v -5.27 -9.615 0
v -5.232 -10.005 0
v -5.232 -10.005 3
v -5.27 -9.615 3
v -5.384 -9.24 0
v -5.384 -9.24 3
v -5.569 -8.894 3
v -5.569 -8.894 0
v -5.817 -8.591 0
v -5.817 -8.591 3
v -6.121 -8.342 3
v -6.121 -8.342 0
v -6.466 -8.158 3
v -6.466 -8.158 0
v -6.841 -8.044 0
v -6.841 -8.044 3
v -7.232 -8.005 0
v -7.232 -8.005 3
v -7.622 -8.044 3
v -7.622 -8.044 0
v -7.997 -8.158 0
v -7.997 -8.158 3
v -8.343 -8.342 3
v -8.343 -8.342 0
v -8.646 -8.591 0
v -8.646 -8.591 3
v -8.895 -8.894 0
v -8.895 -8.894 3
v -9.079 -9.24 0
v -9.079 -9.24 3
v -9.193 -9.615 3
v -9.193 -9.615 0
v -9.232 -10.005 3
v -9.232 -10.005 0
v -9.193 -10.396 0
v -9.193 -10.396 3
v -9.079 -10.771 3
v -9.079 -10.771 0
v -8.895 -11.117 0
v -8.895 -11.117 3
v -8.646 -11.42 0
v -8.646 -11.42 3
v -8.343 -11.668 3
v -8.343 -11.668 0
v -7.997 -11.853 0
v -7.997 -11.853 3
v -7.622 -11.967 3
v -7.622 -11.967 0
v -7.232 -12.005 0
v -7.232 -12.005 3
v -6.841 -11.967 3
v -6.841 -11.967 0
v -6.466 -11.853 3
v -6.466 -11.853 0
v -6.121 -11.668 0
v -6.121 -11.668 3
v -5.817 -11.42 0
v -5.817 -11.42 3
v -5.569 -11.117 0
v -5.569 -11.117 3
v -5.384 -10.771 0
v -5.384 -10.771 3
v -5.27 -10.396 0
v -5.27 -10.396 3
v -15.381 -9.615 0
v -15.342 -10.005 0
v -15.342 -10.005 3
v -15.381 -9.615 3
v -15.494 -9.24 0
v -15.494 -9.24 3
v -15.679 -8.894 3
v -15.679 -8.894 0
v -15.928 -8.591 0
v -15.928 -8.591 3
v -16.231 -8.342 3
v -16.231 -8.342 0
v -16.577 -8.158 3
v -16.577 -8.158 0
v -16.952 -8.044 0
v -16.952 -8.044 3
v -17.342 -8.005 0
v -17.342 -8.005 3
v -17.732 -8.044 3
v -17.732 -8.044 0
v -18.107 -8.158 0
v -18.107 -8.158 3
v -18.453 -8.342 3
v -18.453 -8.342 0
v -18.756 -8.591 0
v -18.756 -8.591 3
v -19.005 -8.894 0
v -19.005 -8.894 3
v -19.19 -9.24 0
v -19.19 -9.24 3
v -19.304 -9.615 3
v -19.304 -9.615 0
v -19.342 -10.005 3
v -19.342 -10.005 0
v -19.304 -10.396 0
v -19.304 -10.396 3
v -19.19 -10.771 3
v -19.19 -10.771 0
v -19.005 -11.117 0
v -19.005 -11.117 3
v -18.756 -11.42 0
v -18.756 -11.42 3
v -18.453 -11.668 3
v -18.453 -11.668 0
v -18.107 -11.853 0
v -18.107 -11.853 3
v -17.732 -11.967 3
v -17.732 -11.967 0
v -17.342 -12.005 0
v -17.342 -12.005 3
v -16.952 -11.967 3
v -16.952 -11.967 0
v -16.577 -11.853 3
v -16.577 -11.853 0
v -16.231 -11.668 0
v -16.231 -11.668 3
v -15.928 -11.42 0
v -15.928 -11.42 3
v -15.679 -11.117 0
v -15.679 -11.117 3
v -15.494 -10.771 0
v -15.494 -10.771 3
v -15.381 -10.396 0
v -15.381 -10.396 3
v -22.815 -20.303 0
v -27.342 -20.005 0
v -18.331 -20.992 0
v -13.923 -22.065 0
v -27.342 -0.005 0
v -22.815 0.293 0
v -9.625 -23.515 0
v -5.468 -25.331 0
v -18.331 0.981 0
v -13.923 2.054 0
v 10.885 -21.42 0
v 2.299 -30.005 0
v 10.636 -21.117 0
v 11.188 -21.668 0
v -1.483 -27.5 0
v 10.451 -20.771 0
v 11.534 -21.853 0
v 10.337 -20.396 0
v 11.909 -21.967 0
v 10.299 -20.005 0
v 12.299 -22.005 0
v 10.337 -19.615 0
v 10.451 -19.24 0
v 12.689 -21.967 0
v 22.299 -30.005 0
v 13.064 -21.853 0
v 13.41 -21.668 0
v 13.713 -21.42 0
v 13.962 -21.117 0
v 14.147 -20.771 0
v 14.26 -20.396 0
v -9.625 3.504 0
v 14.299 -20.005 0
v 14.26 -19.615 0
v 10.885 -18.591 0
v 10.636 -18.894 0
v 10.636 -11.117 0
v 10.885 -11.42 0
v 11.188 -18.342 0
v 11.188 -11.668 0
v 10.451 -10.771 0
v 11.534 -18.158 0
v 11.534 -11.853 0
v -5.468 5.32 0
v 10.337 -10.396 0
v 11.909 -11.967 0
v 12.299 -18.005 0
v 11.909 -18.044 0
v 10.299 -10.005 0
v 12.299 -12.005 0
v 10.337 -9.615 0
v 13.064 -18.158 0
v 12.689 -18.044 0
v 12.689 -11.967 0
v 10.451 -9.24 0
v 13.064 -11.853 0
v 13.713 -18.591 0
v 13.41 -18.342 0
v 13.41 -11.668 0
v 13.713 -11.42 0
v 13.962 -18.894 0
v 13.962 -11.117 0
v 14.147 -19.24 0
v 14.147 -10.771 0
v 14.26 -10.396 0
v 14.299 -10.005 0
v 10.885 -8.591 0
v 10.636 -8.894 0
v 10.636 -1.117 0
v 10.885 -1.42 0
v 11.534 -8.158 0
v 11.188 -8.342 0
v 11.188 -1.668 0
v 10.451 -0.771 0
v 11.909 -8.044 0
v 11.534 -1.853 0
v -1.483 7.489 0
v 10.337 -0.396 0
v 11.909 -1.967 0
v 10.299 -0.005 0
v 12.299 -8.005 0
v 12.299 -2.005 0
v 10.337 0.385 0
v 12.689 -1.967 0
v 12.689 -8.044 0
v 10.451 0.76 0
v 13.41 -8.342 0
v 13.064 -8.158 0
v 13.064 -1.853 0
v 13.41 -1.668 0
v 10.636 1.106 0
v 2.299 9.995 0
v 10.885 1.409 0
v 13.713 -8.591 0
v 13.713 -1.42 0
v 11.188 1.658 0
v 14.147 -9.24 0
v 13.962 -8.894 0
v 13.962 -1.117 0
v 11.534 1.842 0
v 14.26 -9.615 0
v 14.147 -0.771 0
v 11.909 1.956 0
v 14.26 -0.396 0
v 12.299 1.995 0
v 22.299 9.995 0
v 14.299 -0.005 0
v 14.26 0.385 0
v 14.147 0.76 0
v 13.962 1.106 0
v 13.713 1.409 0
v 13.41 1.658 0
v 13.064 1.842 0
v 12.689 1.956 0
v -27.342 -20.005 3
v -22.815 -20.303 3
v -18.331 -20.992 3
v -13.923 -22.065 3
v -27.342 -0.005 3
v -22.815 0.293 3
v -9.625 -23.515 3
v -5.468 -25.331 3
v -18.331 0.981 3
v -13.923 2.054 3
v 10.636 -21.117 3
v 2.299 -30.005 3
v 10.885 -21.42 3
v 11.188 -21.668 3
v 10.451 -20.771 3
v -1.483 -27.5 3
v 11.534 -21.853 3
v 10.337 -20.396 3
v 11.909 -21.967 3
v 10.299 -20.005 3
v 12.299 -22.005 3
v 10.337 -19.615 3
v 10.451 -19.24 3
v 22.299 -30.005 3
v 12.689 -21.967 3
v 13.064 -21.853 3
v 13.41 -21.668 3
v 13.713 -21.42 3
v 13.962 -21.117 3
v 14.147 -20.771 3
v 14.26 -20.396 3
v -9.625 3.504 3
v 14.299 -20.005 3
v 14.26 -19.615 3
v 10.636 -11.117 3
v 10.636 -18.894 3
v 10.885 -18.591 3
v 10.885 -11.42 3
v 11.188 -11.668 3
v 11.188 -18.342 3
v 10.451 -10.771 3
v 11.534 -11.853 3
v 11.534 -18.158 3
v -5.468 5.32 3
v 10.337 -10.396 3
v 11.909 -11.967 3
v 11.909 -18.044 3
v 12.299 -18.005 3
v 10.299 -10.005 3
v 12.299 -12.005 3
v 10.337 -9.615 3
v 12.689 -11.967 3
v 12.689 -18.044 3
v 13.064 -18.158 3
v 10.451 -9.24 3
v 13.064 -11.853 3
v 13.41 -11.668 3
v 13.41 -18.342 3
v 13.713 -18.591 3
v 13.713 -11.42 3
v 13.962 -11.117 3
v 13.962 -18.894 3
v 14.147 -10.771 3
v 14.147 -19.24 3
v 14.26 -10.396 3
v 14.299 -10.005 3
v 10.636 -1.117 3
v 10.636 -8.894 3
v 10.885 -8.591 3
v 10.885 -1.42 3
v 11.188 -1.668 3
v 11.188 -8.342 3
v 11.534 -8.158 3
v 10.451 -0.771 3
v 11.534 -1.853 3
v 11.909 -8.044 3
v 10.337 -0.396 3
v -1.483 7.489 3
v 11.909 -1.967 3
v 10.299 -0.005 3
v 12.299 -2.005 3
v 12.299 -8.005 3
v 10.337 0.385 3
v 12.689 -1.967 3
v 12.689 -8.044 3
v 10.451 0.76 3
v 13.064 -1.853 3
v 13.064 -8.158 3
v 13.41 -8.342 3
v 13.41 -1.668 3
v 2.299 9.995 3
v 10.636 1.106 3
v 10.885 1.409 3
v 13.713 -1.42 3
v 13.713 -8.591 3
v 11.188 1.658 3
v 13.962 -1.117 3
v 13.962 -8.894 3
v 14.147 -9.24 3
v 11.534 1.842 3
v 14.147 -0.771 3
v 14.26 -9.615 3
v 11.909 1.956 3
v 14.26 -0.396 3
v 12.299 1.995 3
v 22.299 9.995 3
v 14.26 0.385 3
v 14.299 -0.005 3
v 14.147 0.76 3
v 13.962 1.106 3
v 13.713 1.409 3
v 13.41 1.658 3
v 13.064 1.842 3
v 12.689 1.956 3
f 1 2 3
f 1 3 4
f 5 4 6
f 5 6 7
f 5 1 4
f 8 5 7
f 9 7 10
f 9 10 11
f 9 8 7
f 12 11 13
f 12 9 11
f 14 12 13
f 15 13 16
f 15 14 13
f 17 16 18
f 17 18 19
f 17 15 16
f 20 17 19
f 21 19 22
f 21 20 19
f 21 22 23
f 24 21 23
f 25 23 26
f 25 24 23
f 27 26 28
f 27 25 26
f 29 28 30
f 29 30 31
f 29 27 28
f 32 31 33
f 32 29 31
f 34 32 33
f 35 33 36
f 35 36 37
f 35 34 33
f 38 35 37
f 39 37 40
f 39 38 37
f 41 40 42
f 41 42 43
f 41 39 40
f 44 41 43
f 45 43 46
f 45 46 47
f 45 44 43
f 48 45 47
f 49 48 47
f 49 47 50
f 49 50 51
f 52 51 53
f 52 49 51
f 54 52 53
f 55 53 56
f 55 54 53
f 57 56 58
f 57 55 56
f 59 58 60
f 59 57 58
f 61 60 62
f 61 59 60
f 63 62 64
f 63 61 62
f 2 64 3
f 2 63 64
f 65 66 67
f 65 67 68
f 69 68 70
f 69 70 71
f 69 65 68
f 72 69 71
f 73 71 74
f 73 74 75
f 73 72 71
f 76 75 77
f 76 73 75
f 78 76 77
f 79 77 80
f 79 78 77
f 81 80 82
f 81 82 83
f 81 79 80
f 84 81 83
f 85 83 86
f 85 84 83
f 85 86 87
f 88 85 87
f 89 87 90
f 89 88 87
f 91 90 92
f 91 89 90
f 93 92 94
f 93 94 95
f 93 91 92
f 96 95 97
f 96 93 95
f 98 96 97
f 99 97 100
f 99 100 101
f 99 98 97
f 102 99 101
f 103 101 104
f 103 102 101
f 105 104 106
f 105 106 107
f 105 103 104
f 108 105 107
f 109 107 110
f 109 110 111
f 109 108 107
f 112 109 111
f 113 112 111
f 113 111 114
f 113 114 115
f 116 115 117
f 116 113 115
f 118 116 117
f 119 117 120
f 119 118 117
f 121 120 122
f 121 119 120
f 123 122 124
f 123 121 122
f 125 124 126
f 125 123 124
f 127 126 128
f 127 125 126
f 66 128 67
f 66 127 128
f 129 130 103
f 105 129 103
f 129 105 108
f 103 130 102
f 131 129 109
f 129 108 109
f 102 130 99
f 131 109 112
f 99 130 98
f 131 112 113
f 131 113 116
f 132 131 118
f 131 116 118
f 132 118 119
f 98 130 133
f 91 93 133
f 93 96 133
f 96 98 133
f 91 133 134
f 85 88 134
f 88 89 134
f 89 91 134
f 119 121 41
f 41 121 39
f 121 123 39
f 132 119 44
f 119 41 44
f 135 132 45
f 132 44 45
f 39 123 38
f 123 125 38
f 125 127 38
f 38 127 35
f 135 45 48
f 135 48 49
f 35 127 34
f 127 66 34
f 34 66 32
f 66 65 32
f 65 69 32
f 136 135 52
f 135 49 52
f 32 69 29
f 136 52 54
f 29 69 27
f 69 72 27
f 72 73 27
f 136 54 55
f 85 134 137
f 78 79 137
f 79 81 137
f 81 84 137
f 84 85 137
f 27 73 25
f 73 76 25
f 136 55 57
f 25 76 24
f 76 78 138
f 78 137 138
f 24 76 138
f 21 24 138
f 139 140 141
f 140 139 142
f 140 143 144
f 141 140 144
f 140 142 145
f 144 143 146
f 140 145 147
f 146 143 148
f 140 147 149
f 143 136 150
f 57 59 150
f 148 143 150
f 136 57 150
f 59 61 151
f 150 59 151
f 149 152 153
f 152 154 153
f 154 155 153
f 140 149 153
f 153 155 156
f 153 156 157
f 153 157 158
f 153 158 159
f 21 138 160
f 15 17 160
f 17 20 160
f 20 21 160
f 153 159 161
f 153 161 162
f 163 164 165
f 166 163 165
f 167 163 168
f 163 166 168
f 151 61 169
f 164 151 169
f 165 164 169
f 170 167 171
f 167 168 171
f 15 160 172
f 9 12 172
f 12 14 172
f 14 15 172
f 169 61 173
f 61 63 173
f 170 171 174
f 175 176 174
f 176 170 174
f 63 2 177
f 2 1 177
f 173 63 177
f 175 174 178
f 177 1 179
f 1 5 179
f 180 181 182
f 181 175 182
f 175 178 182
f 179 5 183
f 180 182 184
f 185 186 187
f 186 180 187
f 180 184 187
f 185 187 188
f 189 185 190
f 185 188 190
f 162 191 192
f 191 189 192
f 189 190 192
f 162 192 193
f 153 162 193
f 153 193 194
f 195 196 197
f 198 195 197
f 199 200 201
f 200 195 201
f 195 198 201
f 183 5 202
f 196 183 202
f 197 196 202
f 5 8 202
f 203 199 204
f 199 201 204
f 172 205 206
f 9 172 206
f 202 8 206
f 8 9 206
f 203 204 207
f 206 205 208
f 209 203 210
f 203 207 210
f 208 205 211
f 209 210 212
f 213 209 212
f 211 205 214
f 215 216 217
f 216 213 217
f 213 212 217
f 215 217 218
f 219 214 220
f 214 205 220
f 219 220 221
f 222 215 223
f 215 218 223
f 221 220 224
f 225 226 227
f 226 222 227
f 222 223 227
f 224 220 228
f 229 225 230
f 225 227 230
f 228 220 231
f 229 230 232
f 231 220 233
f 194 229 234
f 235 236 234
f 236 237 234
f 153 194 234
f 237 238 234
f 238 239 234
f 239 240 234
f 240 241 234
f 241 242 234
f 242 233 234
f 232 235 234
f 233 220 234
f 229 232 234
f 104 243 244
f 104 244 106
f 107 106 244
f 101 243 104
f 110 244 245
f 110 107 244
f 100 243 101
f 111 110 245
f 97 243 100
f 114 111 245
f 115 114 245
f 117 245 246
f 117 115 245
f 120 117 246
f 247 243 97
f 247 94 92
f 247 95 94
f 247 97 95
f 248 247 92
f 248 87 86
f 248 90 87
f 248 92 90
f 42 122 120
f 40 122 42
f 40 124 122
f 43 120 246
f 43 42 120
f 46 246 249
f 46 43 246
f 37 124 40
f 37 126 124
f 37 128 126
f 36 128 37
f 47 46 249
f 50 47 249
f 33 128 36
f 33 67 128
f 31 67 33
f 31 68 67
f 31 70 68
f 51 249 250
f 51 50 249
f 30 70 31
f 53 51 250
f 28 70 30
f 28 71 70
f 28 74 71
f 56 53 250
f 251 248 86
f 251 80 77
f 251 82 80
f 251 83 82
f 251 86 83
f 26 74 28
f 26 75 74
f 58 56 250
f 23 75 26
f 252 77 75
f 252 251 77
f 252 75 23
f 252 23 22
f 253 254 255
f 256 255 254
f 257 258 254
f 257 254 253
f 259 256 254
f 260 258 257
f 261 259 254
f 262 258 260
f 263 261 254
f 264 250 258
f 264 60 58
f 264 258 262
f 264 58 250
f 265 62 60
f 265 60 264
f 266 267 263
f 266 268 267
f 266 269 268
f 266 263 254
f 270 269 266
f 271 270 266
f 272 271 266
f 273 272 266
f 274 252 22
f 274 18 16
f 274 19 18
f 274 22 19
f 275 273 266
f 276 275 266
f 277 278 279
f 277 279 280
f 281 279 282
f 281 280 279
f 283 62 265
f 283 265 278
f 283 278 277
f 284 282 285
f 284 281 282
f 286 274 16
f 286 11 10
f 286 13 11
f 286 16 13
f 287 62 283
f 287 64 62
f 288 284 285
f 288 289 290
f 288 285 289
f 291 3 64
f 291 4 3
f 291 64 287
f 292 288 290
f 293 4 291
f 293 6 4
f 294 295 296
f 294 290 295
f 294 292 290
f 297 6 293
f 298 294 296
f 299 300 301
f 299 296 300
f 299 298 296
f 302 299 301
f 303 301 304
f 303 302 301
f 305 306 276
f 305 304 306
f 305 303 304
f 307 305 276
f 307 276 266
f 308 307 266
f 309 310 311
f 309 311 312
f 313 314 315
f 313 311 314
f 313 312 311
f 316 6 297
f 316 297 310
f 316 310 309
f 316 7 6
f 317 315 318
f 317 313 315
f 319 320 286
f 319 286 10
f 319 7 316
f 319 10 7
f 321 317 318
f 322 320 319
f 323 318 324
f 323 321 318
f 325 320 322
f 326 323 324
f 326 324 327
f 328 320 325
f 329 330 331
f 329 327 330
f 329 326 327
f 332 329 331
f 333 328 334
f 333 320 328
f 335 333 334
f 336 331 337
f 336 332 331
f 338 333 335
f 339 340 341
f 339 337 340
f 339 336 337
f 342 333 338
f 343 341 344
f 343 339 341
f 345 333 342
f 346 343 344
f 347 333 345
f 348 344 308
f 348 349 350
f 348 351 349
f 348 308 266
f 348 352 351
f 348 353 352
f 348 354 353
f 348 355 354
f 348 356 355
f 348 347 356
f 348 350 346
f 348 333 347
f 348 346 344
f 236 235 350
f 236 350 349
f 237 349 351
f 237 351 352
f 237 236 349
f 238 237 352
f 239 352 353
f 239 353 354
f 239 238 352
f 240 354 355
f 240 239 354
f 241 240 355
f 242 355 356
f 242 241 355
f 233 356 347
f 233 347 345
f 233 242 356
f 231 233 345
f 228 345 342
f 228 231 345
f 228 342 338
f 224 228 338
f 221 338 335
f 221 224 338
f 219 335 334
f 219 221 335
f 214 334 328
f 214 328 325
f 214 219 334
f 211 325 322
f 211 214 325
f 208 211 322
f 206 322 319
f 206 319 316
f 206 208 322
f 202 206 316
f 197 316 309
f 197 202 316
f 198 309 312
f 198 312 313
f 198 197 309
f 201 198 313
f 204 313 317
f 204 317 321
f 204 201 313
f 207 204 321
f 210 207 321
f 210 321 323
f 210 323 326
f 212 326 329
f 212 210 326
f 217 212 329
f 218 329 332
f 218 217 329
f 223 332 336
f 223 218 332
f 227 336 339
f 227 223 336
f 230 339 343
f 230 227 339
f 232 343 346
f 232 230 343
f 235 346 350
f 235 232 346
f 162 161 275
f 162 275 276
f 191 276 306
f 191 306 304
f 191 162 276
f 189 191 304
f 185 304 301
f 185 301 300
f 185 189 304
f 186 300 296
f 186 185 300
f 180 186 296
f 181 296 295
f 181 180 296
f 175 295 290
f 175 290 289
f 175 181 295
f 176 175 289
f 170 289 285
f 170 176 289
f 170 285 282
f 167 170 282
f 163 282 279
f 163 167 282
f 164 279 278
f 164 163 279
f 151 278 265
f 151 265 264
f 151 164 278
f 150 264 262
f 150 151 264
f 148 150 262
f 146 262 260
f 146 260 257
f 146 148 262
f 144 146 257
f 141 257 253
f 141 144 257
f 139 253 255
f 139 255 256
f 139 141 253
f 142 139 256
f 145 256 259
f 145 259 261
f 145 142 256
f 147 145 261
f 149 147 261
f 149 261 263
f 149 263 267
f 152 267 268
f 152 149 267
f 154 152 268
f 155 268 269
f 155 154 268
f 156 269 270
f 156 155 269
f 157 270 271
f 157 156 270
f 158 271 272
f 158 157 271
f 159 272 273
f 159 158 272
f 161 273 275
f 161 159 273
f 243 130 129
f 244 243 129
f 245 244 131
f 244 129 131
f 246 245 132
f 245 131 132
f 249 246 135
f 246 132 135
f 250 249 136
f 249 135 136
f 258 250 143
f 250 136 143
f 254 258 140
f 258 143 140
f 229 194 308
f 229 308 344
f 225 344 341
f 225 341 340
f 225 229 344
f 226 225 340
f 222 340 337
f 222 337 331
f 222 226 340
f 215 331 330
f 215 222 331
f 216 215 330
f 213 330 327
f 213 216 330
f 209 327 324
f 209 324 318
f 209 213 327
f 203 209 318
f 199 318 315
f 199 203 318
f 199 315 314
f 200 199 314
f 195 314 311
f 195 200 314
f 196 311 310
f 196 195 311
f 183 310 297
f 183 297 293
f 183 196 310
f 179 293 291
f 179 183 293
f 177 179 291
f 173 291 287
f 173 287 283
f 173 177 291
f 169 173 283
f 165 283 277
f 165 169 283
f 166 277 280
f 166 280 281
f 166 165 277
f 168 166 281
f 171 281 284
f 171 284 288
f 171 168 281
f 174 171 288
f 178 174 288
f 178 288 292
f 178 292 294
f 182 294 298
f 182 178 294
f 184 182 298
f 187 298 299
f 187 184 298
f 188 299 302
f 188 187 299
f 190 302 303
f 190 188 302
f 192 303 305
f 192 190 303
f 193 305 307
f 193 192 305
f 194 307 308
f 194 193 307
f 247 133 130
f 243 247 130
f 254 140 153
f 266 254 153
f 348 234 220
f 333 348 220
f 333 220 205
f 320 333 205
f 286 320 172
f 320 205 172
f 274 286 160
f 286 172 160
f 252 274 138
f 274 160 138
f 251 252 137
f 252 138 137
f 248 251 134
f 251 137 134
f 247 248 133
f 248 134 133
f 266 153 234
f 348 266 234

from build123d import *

# Parameters (mm, degrees)
SKETCH_1_R      = 2
EXTRUDE_1_DEPTH = 3


with BuildPart() as part:
    # 草图1 → 凸台-拉伸1 (new body)
    with BuildSketch(Plane.XY):
        with BuildLine():
            Line((-27.342128098, -0.00537982), (-27.342128098, -20.00537982))
            ThreePointArc((-27.342128098, -20.00537982), (-11.758458295, -22.743290911), (2.298888053, -30.00537982))
            Line((2.298888053, -30.00537982), (22.298888053, -30.00537982))
            Line((22.298888053, -30.00537982), (22.298888053, 9.99462018))
            Line((22.298888053, 9.99462018), (2.298888053, 9.99462018))
            ThreePointArc((2.298888053, 9.99462018), (-11.758458295, 2.732531272), (-27.342128098, -0.00537982))
        make_face()
        with Locations((-17.342128098, -10.00537982)):
            Circle(SKETCH_1_R, mode=Mode.SUBTRACT)
        with Locations((-7.231642467, -10.00537982)):
            Circle(SKETCH_1_R, mode=Mode.SUBTRACT)
        with Locations((12.298888053, -10.00537982)):
            Circle(SKETCH_1_R, mode=Mode.SUBTRACT)
        with Locations((12.298888053, -0.00537982)):
            Circle(SKETCH_1_R, mode=Mode.SUBTRACT)
        with Locations((12.298888053, -20.00537982)):
            Circle(SKETCH_1_R, mode=Mode.SUBTRACT)
    extrude(amount=EXTRUDE_1_DEPTH)


solid = part.part
